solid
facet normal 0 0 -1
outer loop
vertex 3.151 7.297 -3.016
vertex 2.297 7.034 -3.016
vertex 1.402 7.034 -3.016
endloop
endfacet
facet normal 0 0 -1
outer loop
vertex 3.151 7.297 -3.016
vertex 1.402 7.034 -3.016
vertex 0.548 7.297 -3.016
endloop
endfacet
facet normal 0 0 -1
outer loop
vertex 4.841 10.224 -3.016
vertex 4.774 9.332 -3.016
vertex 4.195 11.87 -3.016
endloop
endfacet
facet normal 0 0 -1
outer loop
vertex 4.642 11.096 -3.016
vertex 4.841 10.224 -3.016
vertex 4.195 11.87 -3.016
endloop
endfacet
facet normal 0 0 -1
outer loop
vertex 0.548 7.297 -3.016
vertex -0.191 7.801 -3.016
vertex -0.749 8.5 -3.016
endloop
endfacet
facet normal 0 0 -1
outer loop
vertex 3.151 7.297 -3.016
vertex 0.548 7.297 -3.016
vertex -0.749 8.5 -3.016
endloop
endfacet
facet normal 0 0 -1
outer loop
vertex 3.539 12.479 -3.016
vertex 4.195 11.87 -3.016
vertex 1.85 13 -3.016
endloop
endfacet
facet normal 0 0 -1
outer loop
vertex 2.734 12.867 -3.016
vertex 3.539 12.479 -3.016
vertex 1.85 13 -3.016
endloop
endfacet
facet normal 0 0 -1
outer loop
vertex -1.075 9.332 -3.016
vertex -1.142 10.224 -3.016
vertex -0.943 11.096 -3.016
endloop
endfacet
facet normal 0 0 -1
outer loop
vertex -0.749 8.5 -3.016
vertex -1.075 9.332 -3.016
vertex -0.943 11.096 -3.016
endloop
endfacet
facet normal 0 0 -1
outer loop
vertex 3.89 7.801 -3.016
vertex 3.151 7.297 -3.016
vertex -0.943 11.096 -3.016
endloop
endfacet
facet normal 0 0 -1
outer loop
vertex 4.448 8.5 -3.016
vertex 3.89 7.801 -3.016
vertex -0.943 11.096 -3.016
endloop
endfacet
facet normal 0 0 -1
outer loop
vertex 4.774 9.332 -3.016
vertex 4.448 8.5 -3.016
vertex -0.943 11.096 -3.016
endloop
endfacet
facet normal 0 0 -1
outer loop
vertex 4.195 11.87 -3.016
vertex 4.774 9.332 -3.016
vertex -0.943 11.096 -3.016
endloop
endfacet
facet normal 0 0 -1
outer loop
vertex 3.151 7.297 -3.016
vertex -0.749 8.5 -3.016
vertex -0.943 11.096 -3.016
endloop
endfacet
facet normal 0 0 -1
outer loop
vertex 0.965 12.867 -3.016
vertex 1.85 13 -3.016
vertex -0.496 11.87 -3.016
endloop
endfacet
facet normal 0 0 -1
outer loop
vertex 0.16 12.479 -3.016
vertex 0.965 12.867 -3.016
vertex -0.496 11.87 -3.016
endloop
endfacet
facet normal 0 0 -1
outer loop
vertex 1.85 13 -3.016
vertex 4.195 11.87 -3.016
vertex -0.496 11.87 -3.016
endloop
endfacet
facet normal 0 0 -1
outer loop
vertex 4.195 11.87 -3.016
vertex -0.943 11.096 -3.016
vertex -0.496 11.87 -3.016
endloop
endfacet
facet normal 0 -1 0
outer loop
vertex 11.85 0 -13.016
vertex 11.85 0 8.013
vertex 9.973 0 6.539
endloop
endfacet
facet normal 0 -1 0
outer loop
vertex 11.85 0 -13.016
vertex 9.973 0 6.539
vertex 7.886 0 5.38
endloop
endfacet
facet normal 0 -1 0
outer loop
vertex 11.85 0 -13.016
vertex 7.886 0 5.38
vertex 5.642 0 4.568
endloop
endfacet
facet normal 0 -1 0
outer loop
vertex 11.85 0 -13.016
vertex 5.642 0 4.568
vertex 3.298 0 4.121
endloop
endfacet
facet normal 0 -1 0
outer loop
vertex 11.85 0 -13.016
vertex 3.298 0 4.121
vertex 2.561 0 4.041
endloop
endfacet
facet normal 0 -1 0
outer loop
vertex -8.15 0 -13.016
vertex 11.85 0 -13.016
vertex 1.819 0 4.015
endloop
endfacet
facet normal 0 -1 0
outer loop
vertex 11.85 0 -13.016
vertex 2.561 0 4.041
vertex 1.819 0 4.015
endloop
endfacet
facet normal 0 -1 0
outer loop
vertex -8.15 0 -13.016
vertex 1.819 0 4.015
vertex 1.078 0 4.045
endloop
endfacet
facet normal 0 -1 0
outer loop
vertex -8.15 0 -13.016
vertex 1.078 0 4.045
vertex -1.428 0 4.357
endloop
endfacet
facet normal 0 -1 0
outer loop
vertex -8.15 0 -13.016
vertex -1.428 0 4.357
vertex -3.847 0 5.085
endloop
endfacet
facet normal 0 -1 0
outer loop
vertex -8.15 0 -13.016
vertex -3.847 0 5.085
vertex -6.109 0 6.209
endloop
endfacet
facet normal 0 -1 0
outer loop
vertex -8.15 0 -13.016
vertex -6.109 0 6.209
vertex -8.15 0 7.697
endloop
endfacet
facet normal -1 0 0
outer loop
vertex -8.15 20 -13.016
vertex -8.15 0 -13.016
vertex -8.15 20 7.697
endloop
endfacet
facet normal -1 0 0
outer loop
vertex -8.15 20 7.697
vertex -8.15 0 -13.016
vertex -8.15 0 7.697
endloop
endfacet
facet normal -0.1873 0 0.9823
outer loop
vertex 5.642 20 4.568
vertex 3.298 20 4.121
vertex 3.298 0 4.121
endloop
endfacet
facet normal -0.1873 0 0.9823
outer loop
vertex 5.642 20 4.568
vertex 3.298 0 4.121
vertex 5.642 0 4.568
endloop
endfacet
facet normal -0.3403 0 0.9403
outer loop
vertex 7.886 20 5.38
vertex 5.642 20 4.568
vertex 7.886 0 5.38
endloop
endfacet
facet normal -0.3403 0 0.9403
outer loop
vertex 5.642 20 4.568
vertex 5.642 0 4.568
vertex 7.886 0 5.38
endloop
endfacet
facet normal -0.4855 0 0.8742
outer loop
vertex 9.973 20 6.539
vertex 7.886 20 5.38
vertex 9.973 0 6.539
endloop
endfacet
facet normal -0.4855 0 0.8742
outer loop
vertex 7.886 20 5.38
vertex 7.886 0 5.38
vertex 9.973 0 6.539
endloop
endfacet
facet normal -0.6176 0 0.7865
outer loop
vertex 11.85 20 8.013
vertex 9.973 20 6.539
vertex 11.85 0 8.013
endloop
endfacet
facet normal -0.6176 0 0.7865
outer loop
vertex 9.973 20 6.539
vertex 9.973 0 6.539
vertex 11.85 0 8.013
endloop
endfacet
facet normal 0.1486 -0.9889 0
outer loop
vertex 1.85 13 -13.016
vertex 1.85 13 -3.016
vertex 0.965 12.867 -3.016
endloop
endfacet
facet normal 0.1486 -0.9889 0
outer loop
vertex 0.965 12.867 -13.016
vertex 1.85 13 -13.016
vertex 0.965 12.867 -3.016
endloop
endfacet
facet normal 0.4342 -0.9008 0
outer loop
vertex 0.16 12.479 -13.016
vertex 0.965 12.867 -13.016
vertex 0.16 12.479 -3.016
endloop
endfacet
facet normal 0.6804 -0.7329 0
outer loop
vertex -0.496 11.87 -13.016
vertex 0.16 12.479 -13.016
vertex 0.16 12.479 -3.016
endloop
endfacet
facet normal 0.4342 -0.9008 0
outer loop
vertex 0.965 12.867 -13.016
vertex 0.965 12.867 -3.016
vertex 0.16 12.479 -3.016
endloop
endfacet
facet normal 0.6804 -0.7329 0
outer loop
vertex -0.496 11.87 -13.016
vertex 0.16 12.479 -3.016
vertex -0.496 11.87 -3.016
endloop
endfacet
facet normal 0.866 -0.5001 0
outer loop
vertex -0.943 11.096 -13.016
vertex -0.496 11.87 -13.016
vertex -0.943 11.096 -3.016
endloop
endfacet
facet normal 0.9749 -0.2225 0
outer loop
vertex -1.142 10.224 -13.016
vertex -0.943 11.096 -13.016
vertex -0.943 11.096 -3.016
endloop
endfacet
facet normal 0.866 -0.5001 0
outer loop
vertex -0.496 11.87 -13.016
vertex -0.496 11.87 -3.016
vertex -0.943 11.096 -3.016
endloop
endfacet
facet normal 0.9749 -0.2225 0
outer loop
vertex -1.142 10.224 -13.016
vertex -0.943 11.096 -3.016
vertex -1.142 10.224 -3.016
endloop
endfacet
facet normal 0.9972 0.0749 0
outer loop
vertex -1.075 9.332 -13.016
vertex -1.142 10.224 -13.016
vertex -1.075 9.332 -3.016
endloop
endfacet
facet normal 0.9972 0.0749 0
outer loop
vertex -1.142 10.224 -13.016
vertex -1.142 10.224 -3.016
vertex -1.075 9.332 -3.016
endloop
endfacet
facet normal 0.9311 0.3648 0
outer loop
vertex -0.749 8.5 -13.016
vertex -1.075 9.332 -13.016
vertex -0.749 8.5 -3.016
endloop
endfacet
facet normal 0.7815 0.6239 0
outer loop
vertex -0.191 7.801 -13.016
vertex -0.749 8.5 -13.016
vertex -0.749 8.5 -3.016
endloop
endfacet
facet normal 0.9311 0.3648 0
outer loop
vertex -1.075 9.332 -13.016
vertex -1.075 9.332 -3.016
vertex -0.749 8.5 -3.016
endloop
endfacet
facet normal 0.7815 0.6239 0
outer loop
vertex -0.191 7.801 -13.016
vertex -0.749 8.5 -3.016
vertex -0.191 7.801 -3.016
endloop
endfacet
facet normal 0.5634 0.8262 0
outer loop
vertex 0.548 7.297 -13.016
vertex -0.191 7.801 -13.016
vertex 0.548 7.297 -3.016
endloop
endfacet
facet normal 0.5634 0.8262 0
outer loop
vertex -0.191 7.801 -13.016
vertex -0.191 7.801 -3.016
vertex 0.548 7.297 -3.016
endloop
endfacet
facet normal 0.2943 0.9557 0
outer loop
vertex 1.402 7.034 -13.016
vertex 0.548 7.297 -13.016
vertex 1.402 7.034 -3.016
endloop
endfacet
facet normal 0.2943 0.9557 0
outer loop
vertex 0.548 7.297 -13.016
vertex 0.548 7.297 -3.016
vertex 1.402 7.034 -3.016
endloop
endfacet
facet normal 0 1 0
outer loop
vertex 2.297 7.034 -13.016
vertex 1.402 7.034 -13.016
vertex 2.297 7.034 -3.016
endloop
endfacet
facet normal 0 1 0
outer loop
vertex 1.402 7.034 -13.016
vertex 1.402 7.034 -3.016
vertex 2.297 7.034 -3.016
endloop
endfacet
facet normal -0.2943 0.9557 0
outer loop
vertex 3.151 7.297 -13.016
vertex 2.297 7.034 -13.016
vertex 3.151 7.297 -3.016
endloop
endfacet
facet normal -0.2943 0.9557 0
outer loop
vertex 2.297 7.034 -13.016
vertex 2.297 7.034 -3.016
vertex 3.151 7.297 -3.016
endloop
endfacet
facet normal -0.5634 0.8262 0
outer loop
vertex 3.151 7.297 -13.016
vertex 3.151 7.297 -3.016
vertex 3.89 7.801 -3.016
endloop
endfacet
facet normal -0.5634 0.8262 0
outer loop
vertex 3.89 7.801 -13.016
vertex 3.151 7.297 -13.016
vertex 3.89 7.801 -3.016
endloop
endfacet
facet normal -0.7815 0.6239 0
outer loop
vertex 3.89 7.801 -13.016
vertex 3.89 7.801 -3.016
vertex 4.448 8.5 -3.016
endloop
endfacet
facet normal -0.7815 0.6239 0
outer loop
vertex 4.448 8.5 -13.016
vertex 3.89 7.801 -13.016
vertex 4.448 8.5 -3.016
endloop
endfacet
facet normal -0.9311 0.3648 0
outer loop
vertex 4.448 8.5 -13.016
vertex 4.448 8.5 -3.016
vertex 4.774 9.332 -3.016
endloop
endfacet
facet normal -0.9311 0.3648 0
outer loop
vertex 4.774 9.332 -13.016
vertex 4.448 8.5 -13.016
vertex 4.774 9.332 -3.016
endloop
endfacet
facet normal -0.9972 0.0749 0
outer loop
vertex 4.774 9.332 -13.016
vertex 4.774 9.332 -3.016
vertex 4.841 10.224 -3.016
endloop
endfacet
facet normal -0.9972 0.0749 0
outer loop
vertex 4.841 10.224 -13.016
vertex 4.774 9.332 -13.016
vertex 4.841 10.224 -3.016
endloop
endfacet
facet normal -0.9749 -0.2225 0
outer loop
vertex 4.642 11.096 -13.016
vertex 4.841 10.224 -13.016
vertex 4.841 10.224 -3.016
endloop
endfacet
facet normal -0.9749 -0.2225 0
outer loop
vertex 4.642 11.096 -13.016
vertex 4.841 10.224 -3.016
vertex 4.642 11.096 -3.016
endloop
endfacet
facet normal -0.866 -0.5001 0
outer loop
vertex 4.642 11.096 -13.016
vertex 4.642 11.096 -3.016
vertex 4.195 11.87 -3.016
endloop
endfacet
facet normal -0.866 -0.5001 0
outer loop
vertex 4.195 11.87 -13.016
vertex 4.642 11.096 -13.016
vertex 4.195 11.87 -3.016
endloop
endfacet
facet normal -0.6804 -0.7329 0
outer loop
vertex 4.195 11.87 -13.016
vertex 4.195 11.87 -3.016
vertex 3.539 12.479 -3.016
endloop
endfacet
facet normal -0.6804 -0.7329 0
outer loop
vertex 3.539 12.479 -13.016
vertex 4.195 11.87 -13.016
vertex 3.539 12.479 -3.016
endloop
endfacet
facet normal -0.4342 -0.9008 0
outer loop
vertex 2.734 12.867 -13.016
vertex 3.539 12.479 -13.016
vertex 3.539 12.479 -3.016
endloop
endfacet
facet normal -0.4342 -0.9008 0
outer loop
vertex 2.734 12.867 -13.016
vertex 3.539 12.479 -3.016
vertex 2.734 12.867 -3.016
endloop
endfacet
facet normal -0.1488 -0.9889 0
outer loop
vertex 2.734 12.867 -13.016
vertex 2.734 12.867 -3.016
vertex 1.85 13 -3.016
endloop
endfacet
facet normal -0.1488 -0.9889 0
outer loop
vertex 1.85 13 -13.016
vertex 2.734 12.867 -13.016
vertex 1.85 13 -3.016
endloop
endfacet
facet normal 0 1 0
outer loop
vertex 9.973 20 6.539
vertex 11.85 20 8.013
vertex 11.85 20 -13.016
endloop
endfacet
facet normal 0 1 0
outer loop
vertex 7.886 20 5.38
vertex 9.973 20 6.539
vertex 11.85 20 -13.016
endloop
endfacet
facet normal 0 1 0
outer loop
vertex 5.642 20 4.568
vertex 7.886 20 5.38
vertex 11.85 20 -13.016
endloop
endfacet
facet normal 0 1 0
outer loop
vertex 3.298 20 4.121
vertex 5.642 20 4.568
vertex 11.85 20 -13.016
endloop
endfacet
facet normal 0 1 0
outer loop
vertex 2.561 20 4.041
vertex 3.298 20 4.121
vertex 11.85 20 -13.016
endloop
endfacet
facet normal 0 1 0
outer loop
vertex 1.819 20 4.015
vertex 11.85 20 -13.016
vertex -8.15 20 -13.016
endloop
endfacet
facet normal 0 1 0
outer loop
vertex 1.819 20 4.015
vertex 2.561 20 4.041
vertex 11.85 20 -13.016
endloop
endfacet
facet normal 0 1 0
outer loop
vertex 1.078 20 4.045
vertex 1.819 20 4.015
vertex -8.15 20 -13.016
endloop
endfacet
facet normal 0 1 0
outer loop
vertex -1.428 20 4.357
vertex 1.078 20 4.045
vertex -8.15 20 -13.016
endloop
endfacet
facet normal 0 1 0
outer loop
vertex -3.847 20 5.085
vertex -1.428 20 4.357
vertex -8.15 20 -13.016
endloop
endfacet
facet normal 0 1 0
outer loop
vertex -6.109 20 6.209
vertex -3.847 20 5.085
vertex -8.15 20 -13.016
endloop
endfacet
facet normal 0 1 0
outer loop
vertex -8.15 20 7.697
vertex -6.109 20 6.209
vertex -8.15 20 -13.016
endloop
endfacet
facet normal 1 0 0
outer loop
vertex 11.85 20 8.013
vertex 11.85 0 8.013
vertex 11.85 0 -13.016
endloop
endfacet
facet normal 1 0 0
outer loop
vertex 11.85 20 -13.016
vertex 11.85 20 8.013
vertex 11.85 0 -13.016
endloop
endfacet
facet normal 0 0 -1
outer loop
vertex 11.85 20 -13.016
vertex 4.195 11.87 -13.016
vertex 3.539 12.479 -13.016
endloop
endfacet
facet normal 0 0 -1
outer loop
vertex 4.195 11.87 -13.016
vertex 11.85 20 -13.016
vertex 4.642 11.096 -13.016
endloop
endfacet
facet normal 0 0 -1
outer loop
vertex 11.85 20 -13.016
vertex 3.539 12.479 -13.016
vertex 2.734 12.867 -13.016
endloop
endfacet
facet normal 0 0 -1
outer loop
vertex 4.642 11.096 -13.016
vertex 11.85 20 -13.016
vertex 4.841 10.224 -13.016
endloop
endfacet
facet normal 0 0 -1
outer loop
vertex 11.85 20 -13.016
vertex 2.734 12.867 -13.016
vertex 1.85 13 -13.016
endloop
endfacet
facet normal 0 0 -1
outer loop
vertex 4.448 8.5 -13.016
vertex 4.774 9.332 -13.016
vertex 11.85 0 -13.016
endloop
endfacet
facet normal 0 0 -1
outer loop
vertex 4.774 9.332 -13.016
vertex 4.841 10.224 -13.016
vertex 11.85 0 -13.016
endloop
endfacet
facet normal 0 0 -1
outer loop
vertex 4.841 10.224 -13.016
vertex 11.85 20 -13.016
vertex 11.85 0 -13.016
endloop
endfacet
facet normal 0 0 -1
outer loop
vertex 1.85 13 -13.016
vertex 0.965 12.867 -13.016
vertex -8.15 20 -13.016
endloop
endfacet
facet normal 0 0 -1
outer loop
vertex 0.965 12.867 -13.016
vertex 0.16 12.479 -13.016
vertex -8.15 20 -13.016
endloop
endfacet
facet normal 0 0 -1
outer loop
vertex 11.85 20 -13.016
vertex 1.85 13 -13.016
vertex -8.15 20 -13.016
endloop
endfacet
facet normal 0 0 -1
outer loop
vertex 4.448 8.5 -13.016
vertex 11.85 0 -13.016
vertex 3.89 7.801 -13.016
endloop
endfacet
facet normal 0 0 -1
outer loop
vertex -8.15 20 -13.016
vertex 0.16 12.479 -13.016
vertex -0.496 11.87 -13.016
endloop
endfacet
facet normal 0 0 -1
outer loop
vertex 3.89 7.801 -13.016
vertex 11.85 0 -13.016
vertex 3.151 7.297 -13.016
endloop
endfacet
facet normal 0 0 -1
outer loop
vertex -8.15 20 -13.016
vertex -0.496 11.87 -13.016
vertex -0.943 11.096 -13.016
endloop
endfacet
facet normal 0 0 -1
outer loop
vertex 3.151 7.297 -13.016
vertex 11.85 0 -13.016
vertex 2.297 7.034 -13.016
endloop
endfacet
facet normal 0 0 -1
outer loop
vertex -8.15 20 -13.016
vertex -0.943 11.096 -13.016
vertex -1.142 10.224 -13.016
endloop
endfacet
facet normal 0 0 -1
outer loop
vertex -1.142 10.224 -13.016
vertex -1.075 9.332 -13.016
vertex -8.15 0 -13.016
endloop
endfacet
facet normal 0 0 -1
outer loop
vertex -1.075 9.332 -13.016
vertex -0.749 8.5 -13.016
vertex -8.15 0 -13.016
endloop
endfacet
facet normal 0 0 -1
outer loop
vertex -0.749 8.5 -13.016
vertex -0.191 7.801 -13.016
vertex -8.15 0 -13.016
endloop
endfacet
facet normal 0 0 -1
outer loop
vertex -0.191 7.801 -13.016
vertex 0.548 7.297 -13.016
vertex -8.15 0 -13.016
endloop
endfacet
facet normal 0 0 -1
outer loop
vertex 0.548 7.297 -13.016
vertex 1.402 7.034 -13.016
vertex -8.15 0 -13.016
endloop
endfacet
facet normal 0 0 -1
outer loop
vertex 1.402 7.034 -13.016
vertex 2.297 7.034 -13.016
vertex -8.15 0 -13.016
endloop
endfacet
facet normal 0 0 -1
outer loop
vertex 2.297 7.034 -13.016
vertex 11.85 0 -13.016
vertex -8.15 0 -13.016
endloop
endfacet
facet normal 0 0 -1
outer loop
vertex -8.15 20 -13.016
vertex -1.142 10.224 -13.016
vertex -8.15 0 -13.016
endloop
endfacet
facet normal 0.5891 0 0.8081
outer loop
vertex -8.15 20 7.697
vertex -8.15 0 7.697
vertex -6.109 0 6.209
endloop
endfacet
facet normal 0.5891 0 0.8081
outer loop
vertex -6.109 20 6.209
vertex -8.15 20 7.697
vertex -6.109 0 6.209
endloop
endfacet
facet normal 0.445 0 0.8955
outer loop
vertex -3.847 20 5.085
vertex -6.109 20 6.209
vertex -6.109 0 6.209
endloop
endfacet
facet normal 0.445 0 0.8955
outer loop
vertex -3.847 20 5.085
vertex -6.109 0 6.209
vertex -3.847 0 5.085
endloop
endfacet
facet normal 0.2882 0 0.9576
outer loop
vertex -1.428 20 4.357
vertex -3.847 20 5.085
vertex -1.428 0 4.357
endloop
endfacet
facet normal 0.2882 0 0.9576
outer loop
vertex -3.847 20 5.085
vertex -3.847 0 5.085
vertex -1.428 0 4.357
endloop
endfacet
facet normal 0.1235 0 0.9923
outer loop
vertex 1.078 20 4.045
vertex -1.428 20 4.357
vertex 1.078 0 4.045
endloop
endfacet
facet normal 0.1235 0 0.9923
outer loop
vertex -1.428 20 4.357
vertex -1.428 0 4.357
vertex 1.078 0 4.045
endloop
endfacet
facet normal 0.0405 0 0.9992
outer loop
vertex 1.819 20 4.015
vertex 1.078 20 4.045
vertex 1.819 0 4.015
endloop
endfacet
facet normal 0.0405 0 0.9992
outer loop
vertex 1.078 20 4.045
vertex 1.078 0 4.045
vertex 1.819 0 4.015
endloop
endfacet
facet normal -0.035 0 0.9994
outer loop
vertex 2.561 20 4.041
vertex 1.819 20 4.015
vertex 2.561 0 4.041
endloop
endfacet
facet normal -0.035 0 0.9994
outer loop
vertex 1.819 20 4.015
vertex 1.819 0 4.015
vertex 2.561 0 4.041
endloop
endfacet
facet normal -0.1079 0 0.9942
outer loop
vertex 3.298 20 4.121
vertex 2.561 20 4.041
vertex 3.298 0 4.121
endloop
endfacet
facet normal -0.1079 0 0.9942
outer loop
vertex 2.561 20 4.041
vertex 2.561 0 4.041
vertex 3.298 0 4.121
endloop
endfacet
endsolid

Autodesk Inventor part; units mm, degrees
ref_plane "YZ Plane" through (0, 0, 0) normal (1, 0, 0) x (0, 1, 0)
ref_plane "XZ Plane" through (0, 0, 0) normal (0, 1, 0) x (-1, 0, 0)
ref_plane "XY Plane" through (0, 0, 0) normal (0, 0, 1) x (1, 0, 0)
sketch "スケッチ1" plane through (0, 0, 0) normal (0, 1, 0) x (-1, 0, 0)
  line L0 (8.1505, 14.0302) -> (-11.8495, 14.0302)
  line L1 (-11.8495, 14.0302) -> (-11.8495, -13.0164)
  line L2 (-11.8495, -13.0164) -> (8.1505, -13.0164)
  line L3 (8.1505, -13.0164) -> (8.1505, 14.0302)
  point P0 (0, 0)
  dimension "d0" = 20
extrude "押し出し1" add sketch "スケッチ1" along normal blind 20
sketch "スケッチ2" plane through (-8.1505, 0, 14.0302) normal (0, 0, 1) x (1, 0, 0)
  point P0 (8.1505, 0)
sketch "スケッチ3" plane through (11.8495, 0, -13.0164) normal (0, 0, -1) x (-1, 0, 0)
  circle A0 centre (10, 10) radius 3
  line L0 (0, 20) -> (20, 20) projected
  line L1 (20, 0) -> (20, 20) projected
  point P0 (11.8495, 0)
  dimension "d3" = 6
  dimension "d4" = 10
  dimension "d5" = 10
hole "穴1" at (1.8495, 10, -13.0164) direction (0, 0, 1) diameter 6 depth 10
sketch "スケッチ4" plane through (0, 20, 0) normal (0, 1, 0) x (1, 0, 0)
  circle A0 centre (1.8456, -14.0152) radius 10
  point P0 (0, 0)
  dimension "d13" = 20
hole "穴2" at (1.8456, 20, 14.0152) direction (0, -1, 0) diameter 20 depth 20
sketch "スケッチ5" plane through (0, 20, 0) normal (0, 1, 0) x (1, 0, 0)
  circle A0 centre (1.6726, -19.0329) radius 15
  point P0 (0, 0)
  dimension "d21" = 30
hole "穴3" at (1.6726, 20, 19.0329) direction (0, -1, 0) diameter 30 depth 30
equation "\"BendRadius\" = Thickness"
equation "\"BendReliefWidth\" = Thickness"
equation "\"BendReliefDepth\" = 0.5 * Thickness"
equation "\"CornerReliefSize\" = 4 * Thickness"
equation "\"MinimumRemnant\" = 2 * Thickness"
equation "\"TransitionRadius\" = BendRadius"
equation "\"JacobiRadiusSize\" = BendRadius"
equation "\"GapSize\" = Thickness"
equation "\"Thickness\" = 0.5"
